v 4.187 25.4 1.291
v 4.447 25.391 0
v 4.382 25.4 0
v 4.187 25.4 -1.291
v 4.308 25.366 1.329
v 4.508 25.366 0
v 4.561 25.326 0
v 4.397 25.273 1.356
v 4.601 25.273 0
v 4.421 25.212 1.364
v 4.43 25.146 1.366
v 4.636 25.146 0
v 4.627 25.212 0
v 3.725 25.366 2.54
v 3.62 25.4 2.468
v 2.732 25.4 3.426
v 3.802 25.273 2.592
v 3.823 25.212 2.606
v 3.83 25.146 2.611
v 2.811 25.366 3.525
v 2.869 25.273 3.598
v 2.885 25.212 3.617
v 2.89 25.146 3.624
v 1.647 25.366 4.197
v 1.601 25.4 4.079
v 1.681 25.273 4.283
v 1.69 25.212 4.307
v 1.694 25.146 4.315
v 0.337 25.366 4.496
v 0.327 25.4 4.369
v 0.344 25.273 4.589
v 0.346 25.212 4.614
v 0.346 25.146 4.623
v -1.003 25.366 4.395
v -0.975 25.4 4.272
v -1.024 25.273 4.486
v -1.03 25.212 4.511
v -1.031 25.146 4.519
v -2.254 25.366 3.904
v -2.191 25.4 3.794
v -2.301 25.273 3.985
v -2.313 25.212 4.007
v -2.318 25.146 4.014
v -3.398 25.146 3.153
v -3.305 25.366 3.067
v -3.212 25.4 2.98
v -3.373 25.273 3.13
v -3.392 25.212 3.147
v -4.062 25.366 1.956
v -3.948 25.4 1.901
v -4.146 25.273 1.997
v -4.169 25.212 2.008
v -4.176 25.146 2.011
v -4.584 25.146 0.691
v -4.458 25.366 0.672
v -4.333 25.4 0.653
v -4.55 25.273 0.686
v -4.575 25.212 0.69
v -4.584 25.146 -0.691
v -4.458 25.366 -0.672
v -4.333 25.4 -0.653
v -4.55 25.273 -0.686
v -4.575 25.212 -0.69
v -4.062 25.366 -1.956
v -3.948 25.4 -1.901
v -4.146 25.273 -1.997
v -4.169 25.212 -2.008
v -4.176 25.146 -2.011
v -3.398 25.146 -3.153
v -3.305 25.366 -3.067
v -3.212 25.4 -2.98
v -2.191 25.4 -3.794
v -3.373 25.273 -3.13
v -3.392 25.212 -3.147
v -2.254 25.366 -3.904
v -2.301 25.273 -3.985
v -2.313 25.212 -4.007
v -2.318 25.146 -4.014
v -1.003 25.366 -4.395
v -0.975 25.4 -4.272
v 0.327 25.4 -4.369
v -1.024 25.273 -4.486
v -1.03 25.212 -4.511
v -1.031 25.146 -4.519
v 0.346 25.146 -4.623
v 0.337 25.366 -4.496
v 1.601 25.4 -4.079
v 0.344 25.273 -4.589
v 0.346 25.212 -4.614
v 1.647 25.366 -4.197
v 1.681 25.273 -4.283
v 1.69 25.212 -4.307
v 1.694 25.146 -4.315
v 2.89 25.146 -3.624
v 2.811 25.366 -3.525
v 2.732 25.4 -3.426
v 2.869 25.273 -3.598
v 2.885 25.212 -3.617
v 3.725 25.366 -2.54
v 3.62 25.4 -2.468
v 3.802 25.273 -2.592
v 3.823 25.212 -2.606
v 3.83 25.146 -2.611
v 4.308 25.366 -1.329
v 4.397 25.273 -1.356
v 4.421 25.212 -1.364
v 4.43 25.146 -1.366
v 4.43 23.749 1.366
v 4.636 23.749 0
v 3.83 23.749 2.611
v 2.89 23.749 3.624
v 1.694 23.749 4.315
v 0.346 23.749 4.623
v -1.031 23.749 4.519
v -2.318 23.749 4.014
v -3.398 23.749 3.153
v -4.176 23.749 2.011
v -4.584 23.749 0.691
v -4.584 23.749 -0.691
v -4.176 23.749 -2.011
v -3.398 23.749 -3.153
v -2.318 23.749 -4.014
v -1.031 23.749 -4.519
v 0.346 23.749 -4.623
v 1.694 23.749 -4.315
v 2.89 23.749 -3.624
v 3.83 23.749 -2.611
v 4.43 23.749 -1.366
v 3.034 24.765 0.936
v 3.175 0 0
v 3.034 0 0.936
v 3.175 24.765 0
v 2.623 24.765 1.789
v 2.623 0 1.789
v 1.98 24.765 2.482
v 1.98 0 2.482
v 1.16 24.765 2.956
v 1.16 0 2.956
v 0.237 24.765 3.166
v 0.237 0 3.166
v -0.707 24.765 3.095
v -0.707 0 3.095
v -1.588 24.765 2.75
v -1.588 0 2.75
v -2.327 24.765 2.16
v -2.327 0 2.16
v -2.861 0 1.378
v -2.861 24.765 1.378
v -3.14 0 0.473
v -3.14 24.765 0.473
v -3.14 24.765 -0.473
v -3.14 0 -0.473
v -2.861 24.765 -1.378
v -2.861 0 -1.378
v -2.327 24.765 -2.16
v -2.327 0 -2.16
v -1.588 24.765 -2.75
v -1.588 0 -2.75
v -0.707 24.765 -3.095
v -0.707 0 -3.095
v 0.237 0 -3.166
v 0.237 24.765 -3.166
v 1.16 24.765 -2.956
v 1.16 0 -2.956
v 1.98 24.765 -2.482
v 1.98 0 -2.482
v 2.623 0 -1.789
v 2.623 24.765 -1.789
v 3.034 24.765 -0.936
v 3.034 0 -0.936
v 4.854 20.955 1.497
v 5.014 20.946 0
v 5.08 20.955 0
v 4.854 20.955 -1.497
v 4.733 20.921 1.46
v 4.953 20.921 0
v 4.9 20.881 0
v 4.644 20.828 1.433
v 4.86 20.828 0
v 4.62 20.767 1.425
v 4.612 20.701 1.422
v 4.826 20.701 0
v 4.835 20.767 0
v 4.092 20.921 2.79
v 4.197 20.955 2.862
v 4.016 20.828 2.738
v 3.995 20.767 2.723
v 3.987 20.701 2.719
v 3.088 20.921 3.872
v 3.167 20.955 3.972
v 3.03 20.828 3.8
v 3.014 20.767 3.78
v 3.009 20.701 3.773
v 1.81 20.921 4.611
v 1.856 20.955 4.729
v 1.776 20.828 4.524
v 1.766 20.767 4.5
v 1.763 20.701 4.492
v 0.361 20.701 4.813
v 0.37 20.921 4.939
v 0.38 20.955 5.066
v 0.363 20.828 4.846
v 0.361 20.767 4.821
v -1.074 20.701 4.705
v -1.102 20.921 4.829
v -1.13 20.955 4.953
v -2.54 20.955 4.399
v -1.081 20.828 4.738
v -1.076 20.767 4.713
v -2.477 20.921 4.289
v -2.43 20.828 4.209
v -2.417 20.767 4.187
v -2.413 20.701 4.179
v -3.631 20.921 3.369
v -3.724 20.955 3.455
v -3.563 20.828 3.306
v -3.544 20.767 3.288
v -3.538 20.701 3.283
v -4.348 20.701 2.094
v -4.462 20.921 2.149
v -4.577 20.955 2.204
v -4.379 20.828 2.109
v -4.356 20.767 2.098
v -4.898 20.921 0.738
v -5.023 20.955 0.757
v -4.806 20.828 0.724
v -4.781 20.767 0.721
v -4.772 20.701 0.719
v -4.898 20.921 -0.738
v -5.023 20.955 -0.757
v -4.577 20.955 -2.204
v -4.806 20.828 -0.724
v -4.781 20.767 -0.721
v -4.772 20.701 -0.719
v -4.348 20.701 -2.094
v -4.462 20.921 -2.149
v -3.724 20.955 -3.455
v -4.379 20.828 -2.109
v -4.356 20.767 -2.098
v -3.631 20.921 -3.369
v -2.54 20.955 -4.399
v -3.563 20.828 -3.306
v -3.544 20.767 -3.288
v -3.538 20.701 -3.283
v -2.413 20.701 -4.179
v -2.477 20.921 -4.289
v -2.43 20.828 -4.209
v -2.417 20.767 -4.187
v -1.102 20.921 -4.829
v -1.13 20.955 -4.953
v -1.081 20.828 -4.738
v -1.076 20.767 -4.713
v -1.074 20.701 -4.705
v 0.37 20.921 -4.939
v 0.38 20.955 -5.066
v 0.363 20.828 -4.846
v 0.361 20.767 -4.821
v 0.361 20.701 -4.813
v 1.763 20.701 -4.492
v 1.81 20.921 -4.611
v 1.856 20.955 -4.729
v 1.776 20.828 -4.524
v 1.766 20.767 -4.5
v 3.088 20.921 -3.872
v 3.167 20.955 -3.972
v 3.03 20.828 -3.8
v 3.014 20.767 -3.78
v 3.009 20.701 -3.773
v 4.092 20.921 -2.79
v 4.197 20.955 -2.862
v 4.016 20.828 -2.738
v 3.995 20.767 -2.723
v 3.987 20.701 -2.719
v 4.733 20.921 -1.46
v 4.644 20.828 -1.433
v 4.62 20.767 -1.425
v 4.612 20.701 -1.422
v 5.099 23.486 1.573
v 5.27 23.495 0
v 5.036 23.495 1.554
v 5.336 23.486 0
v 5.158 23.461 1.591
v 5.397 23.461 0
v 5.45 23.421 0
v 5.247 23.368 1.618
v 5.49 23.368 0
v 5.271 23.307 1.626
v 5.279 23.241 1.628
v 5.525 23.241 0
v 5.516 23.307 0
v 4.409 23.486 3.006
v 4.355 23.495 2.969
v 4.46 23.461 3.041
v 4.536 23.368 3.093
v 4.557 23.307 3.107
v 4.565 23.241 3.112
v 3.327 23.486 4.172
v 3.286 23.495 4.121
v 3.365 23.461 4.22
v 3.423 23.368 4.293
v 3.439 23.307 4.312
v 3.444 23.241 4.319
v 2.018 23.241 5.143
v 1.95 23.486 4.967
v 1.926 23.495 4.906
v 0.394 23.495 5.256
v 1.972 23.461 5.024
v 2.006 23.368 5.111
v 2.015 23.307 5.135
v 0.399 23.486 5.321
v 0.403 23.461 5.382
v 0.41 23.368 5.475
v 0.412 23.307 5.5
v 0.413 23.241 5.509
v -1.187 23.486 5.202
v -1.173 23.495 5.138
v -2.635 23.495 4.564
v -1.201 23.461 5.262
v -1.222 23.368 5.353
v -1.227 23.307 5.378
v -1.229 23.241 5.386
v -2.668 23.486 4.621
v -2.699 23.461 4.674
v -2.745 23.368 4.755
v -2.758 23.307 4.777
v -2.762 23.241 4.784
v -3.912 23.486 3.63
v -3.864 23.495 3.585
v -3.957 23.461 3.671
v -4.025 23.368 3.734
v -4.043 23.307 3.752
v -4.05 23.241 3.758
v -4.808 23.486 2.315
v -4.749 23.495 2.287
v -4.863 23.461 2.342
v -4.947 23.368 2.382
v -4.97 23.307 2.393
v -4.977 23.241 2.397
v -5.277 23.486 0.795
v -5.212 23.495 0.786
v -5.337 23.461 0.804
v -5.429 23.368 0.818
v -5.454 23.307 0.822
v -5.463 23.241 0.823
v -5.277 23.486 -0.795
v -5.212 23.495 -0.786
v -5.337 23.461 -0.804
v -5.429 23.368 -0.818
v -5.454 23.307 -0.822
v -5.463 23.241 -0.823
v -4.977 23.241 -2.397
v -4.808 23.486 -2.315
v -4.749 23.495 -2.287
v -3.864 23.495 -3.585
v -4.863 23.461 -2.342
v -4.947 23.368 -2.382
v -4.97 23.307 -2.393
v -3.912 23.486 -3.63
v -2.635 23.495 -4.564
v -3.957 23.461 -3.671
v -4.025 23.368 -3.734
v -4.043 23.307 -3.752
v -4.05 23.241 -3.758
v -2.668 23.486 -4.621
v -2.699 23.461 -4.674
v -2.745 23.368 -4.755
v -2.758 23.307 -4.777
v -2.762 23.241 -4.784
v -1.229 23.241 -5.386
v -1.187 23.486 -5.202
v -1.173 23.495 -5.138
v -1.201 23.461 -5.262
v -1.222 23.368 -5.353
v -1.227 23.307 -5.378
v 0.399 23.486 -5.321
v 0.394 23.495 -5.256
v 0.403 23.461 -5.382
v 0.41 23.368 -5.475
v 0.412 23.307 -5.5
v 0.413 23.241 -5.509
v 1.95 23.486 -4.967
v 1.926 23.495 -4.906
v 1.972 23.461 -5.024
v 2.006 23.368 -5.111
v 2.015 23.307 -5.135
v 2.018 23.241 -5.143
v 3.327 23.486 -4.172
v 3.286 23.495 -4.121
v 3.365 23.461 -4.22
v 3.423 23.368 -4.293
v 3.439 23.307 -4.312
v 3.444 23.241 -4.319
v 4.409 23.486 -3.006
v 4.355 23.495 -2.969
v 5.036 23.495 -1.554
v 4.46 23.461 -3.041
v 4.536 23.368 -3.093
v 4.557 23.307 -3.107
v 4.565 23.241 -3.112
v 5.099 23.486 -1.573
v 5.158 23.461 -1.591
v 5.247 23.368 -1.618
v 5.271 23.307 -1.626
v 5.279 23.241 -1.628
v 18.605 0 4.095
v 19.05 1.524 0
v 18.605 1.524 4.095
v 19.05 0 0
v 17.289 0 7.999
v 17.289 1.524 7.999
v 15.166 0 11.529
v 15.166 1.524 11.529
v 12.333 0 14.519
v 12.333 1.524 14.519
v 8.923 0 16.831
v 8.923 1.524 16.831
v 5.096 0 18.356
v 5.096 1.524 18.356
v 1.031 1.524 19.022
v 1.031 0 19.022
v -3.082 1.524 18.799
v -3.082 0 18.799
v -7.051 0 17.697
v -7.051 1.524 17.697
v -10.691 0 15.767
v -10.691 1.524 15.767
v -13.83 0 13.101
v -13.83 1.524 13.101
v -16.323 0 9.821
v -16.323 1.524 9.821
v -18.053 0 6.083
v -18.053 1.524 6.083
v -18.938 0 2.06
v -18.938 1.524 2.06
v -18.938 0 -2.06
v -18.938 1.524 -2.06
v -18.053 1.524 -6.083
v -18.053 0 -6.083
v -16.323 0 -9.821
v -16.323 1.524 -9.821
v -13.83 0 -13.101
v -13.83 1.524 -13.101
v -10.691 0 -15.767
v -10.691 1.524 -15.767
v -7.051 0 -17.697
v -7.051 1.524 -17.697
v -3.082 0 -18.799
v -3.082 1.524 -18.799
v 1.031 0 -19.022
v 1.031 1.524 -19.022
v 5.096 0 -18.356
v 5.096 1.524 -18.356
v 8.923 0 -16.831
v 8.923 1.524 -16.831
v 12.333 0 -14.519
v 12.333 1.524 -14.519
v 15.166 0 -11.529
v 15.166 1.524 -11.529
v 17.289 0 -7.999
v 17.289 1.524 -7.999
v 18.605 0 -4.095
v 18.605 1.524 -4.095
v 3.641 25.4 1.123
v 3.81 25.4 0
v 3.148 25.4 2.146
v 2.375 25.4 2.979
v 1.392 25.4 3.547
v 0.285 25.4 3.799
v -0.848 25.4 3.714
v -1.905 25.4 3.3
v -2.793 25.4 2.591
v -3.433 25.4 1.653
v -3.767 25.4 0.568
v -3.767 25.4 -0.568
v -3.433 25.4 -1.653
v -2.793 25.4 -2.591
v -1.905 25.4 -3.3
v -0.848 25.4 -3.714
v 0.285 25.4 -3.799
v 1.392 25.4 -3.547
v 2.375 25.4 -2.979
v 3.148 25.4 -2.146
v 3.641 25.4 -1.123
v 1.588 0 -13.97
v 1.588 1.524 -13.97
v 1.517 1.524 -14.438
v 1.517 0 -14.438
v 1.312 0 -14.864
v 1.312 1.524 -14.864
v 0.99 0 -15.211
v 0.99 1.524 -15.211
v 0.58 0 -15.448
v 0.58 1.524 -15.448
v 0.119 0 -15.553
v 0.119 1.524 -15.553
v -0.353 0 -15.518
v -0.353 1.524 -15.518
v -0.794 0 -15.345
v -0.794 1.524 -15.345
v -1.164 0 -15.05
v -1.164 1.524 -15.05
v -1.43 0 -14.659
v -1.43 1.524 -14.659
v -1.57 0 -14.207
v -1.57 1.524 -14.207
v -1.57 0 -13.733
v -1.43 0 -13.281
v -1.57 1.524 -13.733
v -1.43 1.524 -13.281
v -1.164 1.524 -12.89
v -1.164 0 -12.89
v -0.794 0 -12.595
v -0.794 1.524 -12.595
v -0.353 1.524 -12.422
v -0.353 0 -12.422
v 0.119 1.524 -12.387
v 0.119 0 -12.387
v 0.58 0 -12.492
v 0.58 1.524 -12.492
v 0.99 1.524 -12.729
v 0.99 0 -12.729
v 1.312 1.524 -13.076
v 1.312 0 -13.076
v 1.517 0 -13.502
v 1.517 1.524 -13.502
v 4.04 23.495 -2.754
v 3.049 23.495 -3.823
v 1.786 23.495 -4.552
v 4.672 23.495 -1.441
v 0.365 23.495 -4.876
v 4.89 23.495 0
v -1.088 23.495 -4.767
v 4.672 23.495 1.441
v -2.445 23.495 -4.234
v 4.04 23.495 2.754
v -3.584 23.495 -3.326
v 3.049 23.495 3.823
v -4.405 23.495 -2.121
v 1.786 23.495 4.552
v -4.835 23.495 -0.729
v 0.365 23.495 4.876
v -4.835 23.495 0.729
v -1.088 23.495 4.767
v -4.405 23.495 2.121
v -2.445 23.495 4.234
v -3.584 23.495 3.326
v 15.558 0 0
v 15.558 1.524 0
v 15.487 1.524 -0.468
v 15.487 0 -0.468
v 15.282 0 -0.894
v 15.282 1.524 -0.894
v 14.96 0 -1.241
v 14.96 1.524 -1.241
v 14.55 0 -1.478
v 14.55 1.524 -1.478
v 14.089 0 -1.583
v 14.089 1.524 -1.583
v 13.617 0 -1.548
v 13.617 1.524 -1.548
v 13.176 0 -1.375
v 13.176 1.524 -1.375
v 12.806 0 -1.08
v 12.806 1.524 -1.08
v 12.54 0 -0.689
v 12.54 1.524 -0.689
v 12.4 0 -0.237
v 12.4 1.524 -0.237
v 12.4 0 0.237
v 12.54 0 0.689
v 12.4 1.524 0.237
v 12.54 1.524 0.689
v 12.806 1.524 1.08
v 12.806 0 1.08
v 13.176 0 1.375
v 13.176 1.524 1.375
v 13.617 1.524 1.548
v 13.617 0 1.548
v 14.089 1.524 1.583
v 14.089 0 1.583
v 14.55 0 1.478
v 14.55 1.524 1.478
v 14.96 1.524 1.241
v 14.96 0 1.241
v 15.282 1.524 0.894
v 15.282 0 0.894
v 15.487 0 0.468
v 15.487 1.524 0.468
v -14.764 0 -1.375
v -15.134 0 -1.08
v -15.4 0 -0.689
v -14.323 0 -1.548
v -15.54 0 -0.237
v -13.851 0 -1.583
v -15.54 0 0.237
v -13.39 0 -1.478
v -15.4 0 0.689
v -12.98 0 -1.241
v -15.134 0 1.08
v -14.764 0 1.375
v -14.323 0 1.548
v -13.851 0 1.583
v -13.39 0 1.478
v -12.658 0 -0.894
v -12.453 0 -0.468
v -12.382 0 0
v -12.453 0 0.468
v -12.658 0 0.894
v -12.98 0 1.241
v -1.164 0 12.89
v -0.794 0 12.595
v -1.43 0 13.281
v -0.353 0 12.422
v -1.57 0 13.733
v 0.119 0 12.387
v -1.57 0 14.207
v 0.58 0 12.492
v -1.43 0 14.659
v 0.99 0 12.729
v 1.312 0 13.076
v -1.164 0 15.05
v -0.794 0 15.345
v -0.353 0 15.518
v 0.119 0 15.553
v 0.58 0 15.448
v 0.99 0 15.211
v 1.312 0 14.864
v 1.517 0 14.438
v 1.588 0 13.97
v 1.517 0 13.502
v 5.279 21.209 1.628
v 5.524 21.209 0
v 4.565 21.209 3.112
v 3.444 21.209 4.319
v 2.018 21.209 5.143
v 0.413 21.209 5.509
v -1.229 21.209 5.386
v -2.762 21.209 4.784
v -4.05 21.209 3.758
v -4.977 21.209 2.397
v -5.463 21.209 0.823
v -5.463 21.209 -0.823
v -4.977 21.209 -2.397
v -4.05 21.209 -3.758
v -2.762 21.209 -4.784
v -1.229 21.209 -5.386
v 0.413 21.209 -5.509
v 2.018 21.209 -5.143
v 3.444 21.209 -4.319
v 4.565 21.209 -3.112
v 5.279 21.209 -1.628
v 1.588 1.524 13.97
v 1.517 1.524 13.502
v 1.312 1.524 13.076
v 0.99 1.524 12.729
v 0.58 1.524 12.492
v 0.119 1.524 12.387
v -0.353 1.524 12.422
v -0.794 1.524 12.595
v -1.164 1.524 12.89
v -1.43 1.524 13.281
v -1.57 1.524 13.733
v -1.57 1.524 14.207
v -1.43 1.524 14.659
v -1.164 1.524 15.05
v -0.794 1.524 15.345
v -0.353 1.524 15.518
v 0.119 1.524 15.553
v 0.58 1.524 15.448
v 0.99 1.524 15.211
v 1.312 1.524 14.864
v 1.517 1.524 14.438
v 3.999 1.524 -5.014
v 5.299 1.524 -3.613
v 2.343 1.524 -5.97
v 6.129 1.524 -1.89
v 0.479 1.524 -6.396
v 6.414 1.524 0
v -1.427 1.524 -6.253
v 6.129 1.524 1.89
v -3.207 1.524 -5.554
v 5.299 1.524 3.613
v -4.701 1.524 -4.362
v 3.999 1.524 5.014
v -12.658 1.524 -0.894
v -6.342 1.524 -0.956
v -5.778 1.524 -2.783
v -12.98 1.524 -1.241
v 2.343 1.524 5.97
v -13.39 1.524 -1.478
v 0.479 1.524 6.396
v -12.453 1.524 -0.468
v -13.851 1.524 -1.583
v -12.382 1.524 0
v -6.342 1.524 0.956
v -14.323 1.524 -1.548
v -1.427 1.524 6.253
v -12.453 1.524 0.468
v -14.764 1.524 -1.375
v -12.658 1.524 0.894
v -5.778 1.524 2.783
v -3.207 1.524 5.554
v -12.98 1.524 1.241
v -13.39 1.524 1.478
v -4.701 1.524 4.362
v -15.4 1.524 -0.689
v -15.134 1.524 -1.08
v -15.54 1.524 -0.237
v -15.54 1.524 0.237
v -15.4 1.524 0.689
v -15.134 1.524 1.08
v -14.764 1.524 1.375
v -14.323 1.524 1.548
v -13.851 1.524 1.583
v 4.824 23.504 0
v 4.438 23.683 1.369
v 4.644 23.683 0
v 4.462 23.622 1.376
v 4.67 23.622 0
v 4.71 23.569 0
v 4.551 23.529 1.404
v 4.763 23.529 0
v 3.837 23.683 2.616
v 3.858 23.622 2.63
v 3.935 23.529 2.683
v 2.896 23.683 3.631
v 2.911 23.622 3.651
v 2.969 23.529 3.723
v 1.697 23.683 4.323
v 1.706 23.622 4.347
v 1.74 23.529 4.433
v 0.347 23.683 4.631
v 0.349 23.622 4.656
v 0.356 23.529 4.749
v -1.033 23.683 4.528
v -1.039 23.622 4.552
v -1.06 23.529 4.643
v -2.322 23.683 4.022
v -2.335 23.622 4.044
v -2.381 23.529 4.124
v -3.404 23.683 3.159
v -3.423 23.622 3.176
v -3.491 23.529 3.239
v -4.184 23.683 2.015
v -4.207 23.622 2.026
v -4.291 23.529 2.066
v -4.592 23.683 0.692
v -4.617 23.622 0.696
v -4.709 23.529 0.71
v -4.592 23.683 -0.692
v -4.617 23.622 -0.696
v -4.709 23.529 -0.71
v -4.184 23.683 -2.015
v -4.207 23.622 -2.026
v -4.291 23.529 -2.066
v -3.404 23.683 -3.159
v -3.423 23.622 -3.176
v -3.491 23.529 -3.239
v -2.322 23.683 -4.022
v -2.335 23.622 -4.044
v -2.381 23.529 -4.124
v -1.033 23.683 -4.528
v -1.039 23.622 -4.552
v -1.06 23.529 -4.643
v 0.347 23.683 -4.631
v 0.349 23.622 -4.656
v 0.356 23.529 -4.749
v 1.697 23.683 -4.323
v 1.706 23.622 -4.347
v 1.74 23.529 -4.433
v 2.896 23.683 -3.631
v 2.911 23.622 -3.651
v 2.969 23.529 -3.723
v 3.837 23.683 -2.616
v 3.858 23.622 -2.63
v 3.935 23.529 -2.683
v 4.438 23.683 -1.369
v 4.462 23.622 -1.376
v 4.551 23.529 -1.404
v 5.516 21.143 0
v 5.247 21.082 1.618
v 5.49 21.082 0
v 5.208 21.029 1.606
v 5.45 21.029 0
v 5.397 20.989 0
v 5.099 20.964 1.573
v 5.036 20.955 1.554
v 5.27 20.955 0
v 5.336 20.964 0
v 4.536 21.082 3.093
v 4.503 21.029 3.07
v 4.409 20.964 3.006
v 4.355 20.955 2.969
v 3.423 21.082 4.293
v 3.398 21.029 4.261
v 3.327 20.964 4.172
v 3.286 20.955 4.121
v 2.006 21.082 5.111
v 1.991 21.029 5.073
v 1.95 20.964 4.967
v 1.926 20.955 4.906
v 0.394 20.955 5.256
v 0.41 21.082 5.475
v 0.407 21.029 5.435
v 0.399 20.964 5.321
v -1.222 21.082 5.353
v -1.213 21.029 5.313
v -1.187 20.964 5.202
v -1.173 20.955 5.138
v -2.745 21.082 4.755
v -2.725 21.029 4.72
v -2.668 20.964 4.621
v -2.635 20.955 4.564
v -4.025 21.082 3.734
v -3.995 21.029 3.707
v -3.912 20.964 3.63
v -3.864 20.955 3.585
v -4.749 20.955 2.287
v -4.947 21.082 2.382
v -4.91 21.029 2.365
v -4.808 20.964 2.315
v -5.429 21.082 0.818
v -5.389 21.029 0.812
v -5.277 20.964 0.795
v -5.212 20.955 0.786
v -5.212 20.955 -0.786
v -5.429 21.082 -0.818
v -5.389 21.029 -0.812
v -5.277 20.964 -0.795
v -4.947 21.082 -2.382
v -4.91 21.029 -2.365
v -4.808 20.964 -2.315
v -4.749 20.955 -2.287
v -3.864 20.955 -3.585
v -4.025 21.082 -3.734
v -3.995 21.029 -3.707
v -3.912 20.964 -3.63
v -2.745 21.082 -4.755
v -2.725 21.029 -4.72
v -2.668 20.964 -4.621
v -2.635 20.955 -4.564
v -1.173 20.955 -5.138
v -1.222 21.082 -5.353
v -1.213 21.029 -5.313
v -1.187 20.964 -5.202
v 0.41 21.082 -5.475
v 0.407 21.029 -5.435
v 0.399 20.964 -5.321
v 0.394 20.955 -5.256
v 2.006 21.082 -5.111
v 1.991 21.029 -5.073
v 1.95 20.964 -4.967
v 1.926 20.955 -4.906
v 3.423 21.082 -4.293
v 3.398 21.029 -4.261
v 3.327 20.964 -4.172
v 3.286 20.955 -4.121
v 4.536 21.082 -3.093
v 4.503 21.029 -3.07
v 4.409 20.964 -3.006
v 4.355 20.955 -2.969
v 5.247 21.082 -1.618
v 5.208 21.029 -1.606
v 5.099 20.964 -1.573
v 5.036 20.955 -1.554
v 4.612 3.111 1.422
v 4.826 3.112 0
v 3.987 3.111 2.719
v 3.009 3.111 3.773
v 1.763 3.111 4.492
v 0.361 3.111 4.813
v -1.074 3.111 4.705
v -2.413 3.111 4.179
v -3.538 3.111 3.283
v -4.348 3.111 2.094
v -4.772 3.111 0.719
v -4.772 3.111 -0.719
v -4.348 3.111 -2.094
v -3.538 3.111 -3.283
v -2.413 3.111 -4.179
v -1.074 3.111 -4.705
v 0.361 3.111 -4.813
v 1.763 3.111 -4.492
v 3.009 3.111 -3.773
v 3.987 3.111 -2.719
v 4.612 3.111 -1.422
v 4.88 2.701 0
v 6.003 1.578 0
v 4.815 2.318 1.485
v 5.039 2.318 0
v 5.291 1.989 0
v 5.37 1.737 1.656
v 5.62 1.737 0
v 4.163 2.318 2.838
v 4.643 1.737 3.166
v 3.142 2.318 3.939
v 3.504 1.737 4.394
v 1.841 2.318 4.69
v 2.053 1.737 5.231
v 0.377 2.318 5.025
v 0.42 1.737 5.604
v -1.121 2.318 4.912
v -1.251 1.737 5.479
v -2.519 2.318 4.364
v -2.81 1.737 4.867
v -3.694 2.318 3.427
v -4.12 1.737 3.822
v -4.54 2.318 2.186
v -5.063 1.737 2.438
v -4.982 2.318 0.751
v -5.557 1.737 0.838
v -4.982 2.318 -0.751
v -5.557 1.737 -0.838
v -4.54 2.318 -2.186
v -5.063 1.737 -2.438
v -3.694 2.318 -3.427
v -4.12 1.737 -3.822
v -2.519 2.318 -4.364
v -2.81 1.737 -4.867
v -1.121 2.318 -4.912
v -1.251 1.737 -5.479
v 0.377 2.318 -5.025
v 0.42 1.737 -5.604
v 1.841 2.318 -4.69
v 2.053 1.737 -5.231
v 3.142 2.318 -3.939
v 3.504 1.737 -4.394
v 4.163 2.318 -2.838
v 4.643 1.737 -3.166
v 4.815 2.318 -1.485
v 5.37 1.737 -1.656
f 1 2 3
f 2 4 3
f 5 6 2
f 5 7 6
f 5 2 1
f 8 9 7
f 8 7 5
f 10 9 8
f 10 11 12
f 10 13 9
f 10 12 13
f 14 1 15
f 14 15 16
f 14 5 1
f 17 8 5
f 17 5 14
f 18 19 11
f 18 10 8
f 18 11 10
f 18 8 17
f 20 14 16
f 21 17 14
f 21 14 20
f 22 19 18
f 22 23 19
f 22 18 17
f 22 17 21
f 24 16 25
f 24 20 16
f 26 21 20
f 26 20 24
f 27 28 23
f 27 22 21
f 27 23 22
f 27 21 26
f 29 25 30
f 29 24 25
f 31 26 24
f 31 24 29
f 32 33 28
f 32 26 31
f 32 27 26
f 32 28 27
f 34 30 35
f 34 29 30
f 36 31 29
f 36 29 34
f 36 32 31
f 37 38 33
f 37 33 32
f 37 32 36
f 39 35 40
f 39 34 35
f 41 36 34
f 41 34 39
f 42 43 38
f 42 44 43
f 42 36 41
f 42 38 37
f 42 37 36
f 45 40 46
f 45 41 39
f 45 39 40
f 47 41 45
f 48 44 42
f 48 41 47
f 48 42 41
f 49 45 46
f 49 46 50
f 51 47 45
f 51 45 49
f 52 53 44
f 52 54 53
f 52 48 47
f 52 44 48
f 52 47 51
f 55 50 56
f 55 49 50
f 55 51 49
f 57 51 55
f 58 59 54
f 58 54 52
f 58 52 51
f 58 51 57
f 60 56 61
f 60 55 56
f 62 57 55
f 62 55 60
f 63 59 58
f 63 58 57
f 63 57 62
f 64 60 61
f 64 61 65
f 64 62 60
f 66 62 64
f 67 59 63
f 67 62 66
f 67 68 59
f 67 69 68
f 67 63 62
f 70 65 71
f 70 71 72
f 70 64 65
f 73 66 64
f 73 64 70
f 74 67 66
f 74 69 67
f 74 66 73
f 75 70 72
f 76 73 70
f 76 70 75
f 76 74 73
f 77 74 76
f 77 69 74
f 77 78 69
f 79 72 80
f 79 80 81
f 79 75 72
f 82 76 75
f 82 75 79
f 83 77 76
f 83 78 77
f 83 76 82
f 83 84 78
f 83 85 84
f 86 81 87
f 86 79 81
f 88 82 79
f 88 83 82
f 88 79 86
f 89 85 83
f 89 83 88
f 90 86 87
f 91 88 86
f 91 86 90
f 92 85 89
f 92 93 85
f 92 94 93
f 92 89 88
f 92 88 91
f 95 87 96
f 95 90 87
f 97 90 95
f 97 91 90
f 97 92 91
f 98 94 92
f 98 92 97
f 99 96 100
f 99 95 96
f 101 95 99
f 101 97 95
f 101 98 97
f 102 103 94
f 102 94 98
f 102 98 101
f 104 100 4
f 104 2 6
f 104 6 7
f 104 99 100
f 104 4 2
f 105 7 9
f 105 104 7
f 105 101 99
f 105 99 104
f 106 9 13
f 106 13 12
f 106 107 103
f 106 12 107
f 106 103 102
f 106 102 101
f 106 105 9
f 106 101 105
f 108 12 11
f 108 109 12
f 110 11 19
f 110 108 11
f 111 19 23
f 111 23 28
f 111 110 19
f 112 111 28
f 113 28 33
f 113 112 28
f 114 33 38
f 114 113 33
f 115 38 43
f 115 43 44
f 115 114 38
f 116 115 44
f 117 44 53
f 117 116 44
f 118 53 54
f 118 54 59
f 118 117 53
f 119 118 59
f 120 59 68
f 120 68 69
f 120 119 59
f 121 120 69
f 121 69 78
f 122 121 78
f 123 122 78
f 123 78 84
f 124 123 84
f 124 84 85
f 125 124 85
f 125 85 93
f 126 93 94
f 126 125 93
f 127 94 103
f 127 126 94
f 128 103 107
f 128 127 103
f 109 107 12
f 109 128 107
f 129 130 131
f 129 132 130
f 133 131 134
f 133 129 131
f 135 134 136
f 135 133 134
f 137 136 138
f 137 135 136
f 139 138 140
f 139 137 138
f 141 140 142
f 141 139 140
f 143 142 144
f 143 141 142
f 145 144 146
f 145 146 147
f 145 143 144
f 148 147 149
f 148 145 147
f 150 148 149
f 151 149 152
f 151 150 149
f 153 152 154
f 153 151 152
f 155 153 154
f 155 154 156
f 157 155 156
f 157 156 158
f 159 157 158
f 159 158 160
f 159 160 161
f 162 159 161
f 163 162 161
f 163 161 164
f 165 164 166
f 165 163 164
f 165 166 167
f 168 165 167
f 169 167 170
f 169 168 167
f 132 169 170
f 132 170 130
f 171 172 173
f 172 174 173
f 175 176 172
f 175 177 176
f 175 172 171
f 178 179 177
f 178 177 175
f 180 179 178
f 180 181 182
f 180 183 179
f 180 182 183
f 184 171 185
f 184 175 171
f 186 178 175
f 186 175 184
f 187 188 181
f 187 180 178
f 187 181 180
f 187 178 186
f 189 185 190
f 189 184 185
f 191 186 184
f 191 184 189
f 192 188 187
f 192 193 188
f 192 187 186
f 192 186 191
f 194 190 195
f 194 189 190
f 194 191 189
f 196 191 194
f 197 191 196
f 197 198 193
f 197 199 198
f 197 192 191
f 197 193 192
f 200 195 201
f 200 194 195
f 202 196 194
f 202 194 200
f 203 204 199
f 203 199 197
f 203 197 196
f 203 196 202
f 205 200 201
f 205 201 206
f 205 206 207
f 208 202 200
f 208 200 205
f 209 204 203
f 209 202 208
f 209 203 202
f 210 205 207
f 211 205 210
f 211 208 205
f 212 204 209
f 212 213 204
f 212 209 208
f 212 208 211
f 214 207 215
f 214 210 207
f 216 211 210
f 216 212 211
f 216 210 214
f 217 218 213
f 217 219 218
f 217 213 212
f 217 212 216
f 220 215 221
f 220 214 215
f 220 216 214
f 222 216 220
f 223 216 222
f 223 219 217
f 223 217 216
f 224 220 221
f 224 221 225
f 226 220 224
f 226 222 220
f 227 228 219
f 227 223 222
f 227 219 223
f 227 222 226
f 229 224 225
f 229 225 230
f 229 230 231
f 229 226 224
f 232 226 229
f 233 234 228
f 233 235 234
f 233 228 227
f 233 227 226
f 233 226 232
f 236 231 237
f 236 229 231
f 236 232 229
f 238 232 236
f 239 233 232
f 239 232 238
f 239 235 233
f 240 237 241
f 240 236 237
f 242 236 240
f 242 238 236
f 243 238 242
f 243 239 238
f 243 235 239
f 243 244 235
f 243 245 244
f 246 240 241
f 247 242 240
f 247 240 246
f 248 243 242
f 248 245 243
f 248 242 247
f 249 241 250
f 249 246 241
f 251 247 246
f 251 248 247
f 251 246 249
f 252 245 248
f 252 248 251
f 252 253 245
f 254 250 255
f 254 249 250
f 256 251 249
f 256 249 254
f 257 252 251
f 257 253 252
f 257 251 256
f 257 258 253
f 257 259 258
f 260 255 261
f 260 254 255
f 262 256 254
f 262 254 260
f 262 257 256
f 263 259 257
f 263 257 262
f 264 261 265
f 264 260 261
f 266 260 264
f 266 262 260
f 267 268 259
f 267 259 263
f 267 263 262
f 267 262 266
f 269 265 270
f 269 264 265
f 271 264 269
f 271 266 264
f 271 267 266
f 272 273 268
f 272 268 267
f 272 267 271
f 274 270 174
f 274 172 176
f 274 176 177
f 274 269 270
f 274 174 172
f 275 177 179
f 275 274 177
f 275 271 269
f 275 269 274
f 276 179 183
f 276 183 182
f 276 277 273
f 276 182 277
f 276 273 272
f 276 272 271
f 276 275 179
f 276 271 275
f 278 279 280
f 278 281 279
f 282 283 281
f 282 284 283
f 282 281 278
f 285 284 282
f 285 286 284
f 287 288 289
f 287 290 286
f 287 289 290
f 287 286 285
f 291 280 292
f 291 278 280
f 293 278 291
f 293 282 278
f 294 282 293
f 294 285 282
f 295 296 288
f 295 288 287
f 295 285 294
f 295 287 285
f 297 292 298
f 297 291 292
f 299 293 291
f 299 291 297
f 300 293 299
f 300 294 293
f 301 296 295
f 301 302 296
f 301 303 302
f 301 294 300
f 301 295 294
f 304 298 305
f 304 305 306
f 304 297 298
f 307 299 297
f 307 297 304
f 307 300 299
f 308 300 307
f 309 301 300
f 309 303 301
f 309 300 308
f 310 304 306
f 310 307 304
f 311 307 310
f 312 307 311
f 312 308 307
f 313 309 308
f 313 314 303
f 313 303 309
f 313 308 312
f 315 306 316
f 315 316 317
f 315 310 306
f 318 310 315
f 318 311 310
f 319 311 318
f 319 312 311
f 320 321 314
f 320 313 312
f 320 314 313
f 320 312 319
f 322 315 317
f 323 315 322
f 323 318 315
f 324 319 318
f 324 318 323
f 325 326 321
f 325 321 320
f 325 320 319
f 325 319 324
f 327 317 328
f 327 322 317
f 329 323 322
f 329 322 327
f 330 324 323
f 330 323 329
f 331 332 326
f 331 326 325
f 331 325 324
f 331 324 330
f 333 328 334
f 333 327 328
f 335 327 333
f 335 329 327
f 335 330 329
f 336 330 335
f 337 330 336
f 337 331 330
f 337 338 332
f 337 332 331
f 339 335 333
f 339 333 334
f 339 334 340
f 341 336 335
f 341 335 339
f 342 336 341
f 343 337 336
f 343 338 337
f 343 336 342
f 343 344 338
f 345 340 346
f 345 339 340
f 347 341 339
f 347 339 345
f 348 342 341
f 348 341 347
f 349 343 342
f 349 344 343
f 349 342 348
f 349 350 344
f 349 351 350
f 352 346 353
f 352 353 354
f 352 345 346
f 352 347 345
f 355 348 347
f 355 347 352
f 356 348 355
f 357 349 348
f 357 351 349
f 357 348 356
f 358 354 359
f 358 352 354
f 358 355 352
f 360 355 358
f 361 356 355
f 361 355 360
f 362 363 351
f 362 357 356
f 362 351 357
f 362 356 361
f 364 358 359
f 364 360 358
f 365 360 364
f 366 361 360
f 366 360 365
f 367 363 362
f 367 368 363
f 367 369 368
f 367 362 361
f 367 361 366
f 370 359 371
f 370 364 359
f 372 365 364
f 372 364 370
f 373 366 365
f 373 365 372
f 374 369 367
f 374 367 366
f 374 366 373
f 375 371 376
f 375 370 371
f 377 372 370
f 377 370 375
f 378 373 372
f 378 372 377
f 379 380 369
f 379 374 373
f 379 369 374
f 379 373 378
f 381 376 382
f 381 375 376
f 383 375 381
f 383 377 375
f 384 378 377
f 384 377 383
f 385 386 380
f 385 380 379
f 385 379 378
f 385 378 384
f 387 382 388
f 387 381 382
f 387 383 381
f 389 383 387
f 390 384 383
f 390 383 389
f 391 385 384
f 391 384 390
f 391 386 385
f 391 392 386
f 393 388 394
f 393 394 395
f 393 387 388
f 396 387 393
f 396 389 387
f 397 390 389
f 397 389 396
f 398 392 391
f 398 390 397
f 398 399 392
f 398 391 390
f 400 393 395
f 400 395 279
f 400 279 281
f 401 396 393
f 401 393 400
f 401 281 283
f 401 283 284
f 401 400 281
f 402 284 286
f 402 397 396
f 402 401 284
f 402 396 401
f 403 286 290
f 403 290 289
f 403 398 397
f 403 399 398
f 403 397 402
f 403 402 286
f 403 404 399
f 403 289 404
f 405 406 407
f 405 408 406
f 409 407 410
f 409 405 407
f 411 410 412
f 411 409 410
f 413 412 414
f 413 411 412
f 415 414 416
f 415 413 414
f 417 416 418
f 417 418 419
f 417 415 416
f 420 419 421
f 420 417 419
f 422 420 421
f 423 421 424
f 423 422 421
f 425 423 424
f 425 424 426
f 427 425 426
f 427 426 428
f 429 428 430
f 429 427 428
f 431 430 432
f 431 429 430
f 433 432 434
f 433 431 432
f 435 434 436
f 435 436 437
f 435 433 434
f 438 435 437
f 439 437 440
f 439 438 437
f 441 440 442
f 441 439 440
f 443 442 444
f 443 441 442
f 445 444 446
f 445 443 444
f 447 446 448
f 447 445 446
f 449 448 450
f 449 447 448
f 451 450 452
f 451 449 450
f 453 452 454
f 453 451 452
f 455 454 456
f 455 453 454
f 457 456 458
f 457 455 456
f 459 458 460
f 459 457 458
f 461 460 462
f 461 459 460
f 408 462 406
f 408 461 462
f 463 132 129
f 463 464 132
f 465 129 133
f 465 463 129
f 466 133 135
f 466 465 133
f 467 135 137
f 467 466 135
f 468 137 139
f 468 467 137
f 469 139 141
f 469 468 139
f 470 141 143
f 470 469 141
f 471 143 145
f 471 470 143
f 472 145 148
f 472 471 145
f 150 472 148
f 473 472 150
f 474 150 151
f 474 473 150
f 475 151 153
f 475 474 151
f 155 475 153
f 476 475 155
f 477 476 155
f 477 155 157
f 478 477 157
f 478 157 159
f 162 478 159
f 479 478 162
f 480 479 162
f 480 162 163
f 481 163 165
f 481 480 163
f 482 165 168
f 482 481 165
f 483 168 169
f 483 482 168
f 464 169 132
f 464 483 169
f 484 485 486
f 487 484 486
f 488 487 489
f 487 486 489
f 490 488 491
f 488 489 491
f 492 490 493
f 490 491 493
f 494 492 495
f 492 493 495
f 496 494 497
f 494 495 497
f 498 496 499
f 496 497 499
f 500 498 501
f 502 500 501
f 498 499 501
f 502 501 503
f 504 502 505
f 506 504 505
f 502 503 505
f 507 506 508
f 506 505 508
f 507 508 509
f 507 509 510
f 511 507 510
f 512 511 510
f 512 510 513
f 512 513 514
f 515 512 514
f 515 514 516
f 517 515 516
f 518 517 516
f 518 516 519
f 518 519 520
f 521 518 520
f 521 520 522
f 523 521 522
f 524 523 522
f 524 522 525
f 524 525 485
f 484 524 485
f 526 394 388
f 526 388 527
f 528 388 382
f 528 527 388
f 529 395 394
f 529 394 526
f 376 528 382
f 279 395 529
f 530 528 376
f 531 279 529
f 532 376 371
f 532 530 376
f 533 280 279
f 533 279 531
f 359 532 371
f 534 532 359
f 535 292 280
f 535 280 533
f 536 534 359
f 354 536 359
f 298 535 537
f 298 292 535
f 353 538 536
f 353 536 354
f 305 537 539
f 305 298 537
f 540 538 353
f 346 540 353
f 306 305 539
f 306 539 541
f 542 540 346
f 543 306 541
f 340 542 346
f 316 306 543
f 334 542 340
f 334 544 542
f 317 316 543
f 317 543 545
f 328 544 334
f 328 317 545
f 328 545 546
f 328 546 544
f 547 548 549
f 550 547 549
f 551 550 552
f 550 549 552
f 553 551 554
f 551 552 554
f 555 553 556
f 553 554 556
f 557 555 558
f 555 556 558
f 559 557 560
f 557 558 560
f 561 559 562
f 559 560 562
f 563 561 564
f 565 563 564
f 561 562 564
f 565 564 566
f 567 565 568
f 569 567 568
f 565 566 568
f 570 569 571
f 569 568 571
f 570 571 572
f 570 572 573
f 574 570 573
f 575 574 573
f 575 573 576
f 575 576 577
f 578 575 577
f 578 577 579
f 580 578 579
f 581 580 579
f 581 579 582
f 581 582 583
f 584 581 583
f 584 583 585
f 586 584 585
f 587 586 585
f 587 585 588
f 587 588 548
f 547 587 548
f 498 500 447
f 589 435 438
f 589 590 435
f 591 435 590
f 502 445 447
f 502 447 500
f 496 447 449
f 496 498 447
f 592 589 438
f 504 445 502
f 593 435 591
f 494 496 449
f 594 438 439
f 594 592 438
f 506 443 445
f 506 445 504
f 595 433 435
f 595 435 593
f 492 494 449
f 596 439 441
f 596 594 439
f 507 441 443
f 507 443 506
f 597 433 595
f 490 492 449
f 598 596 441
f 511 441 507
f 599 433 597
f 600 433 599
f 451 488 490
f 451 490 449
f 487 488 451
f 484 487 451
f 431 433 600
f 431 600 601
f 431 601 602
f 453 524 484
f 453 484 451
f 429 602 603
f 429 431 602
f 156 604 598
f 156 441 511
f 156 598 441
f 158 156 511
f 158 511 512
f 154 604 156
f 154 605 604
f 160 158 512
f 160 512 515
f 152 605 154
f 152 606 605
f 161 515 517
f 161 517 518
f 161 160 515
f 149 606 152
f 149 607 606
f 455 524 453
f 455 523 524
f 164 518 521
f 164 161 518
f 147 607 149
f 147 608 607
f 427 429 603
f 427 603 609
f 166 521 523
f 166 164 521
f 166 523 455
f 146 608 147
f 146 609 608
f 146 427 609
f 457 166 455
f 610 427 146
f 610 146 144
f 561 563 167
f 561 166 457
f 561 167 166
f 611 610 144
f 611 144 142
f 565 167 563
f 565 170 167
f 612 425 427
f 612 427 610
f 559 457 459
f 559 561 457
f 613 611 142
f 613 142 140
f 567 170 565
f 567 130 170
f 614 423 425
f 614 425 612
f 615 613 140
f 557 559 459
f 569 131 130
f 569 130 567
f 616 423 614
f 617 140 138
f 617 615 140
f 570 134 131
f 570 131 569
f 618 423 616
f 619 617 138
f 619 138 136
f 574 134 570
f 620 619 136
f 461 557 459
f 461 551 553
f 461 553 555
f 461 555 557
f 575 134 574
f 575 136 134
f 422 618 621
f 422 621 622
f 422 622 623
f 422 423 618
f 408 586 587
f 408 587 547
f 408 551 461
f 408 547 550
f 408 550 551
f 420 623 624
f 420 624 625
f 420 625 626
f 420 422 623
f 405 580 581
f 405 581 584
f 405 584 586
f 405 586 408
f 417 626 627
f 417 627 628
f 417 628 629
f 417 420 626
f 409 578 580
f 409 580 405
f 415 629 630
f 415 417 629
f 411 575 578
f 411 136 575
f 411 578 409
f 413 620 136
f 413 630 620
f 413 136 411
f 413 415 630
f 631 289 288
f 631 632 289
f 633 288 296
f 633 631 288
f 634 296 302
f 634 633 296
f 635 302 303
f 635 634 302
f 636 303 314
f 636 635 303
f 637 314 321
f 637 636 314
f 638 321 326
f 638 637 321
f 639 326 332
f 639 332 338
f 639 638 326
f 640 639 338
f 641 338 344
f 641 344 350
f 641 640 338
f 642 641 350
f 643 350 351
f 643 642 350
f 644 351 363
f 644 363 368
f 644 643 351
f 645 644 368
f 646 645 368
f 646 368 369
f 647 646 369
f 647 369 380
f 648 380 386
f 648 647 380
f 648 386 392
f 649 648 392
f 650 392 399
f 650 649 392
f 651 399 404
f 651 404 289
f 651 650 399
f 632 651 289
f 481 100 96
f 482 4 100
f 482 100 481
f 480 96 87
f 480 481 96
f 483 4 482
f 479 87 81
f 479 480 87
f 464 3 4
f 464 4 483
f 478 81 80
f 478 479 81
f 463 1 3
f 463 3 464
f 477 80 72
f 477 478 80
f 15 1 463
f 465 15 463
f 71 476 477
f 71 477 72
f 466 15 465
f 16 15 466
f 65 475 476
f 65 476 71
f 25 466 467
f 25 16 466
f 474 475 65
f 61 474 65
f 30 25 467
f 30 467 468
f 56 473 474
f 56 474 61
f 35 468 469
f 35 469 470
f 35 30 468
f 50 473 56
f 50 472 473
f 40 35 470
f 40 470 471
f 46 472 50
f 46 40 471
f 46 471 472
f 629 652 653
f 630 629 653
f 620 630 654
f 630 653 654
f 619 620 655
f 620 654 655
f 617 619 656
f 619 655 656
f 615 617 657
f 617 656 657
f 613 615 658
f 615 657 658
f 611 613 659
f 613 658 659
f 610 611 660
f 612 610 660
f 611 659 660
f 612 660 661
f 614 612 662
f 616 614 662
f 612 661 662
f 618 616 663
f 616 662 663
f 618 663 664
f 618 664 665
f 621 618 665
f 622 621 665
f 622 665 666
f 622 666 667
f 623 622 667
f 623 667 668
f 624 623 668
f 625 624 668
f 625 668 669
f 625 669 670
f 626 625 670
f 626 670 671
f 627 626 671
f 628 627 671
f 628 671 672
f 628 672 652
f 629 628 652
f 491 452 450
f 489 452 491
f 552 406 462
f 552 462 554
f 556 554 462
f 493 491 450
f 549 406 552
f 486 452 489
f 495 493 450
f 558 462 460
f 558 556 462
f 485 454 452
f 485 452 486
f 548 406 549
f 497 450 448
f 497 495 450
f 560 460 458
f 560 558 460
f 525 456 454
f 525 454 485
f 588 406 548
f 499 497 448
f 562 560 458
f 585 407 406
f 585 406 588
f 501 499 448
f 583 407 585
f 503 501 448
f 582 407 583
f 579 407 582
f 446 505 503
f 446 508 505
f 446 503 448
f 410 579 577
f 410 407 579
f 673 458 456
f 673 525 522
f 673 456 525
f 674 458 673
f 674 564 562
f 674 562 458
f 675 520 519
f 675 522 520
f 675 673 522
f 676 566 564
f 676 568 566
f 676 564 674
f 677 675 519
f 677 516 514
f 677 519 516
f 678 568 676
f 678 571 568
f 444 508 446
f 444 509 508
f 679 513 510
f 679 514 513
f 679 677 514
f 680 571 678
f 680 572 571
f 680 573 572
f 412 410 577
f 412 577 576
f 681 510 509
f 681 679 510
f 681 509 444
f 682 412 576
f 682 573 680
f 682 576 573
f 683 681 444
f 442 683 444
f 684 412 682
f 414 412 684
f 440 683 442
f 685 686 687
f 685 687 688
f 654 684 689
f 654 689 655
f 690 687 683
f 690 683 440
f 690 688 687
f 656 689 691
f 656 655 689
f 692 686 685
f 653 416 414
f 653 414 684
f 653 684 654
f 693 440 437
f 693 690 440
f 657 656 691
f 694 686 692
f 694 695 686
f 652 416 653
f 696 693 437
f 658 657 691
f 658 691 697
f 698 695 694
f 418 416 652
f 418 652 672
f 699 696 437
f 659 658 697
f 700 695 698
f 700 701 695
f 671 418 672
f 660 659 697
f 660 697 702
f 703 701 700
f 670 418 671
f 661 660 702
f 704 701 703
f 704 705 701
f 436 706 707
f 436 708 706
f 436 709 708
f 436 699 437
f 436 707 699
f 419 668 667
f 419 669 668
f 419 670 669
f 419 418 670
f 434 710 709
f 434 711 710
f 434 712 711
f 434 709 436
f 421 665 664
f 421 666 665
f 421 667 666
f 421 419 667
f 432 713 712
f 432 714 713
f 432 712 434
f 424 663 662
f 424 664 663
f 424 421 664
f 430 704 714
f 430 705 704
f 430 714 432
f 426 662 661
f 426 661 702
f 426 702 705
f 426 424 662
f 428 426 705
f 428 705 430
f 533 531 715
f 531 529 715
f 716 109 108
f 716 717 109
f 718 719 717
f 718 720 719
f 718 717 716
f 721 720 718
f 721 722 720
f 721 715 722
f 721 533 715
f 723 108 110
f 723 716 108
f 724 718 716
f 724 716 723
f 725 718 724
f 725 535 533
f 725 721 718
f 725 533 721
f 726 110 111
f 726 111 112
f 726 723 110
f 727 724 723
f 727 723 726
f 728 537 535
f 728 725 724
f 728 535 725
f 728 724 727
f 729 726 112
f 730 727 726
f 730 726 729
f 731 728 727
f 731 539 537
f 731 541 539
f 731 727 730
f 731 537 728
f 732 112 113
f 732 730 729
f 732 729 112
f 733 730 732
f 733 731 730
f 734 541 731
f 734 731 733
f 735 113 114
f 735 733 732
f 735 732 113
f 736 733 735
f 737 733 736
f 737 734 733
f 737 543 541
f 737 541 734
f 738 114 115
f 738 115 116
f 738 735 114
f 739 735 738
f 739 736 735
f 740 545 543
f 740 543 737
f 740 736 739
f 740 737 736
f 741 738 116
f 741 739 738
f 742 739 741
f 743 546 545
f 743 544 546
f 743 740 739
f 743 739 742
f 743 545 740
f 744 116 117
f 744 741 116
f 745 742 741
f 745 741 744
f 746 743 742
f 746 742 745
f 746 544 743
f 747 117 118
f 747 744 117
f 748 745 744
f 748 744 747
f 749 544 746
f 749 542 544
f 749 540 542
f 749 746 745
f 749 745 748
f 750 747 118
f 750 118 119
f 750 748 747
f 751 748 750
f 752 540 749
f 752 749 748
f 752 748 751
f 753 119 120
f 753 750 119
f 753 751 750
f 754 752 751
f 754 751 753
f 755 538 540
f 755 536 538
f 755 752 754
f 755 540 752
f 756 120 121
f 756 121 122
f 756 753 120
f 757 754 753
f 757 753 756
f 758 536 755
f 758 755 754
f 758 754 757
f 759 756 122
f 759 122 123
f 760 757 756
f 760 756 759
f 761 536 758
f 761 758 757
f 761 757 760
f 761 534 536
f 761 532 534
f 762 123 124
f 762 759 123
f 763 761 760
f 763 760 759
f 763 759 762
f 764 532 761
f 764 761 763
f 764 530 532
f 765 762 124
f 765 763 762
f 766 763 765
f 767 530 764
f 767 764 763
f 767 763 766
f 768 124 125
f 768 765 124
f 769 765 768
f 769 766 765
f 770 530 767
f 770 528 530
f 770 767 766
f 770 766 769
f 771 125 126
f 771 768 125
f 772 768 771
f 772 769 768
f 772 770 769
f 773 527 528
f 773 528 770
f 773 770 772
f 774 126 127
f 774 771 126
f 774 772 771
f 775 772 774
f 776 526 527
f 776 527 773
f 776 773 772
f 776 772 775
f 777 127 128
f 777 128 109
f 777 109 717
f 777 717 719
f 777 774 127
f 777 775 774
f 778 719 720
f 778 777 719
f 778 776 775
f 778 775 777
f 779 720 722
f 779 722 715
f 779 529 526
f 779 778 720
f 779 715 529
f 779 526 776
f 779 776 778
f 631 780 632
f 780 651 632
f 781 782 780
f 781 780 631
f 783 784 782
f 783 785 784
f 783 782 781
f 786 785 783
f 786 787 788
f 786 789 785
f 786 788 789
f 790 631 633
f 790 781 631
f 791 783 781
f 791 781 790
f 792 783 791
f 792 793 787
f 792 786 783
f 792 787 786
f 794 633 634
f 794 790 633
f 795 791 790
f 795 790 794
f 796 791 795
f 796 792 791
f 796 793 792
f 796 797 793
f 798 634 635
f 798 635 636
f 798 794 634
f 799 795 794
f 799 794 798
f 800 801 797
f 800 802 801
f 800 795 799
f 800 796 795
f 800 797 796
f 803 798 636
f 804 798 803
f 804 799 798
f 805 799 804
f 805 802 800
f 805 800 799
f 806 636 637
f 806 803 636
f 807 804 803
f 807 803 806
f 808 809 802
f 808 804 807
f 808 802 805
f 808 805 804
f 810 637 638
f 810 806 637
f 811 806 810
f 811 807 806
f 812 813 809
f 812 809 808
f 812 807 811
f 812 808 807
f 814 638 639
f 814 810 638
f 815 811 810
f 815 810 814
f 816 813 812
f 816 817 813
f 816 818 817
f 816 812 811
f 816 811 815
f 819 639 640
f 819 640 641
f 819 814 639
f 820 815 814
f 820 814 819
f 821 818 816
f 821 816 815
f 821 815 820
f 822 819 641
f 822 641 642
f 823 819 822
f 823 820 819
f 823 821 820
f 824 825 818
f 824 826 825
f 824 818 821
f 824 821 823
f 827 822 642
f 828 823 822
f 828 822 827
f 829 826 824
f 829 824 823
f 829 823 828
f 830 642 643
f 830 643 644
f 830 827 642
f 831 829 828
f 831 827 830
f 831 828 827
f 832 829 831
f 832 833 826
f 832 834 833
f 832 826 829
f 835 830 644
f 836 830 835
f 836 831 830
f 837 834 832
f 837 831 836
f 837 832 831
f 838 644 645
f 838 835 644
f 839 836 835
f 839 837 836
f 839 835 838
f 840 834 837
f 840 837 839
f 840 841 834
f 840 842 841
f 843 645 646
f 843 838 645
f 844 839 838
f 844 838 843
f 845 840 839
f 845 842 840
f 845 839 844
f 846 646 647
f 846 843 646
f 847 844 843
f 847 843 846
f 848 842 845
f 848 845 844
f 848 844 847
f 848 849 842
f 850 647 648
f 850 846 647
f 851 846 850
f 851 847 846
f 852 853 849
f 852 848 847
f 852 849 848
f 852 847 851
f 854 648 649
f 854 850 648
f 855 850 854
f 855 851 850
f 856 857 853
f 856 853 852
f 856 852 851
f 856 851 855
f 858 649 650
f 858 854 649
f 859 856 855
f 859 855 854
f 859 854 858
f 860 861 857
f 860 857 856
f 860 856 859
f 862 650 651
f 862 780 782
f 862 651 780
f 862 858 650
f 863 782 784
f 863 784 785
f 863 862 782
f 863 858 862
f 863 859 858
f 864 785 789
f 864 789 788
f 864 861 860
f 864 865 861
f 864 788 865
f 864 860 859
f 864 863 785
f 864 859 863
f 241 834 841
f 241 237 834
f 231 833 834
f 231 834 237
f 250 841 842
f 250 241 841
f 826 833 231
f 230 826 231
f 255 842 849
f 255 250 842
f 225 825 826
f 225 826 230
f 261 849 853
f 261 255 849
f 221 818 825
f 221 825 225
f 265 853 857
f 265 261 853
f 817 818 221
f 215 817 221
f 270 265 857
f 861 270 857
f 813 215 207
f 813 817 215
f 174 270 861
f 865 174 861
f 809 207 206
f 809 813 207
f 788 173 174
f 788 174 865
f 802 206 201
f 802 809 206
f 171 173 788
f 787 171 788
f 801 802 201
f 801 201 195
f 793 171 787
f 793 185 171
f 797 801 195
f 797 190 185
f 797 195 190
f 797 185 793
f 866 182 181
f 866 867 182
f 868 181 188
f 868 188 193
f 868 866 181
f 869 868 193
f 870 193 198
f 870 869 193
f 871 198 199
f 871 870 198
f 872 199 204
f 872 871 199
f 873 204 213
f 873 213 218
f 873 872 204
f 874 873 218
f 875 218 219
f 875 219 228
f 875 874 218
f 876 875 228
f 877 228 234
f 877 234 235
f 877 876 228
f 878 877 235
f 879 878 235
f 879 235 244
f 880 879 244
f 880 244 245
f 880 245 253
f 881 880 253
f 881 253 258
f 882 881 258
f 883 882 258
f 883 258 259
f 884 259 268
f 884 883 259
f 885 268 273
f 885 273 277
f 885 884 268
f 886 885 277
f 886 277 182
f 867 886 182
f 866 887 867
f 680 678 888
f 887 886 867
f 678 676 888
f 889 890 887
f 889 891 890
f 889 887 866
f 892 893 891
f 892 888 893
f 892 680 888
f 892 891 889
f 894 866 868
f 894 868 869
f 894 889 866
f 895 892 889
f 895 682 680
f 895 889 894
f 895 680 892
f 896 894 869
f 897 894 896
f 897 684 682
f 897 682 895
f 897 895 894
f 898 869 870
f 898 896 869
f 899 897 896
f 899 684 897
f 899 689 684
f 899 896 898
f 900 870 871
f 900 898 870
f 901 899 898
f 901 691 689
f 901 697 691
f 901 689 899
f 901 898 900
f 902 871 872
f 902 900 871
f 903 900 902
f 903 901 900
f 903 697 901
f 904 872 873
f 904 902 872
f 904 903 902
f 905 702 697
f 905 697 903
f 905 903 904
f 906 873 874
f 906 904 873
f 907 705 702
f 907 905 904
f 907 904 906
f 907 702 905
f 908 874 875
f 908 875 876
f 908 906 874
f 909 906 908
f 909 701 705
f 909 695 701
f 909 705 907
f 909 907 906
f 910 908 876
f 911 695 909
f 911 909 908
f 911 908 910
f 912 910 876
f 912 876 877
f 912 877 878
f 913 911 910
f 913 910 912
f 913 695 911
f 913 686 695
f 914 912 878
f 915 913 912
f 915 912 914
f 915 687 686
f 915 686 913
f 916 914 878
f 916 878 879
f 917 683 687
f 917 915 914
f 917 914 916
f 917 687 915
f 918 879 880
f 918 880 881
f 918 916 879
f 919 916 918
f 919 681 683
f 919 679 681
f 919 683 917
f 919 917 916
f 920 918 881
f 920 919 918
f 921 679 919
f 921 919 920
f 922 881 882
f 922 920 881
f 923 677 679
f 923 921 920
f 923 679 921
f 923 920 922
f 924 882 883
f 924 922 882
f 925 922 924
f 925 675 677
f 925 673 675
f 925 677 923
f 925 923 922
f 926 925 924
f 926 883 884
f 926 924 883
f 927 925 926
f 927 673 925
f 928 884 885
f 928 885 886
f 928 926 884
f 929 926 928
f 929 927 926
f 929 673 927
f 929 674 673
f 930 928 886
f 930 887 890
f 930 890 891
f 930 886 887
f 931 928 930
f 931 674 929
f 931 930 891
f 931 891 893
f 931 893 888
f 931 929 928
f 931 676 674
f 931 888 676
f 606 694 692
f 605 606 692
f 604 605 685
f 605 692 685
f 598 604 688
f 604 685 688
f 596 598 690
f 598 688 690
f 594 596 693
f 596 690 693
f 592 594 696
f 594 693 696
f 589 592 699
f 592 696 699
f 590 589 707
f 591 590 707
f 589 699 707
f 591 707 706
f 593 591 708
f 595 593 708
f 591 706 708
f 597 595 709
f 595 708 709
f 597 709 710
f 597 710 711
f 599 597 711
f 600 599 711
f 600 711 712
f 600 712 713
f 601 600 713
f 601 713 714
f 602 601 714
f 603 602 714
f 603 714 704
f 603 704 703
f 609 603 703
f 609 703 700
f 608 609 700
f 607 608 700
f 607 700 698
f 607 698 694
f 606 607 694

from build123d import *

# Parameters (mm, degrees)
SKETCH2_R          = 1.5875
CUT_EXTRUDE1_DEPTH = 2.524


with BuildPart() as part:
    # Sketch1 → Revolve1 (revolve)
    with BuildSketch(Plane.XY):
        with BuildLine():
            Line((4.6355, 25.146), (4.6355, 23.749))
            ThreePointArc((4.6355, 23.749), (4.709894878, 23.569394878), (4.8895, 23.495))
            Line((4.8895, 23.495), (5.2705, 23.495))
            ThreePointArc((5.2705, 23.495), (5.450105122, 23.420605122), (5.5245, 23.241))
            Line((5.5245, 23.241), (5.5245, 21.209))
            ThreePointArc((5.5245, 21.209), (5.450105122, 21.029394878), (5.2705, 20.955))
            Line((5.2705, 20.955), (5.08, 20.955))
            ThreePointArc((5.08, 20.955), (4.900394878, 20.880605122), (4.826, 20.701))
            Line((4.826, 20.701), (4.826, 3.1115))
            ThreePointArc((4.826, 3.1115), (5.290967985, 1.988967985), (6.4135, 1.524))
            Line((6.4135, 1.524), (19.05, 1.524))
            Line((19.05, 1.524), (19.05, 0))
            Line((19.05, 0), (3.175, 0))
            Line((3.175, 0), (3.175, 24.765))
            Line((3.175, 24.765), (3.81, 25.4))
            Line((3.81, 25.4), (4.3815, 25.4))
            ThreePointArc((4.3815, 25.4), (4.561105122, 25.325605122), (4.6355, 25.146))
        make_face()
    revolve(axis=Axis((0, 26.6065, 0), (0, -1, 0)))

    # Sketch2 → Cut-Extrude1 (cut, through all)
    with BuildSketch(Plane(origin=(0, 1.524, 0), x_dir=(1, 0, 0), z_dir=(0, 1, 0))):
        with Locations((0, 13.97)):
            Circle(SKETCH2_R)
        with Locations((13.97, 0)):
            Circle(SKETCH2_R)
        with Locations((0, -13.97)):
            Circle(SKETCH2_R)
        with Locations((-13.97, 0)):
            Circle(SKETCH2_R)
    extrude(amount=-CUT_EXTRUDE1_DEPTH, mode=Mode.SUBTRACT)


solid = part.part
